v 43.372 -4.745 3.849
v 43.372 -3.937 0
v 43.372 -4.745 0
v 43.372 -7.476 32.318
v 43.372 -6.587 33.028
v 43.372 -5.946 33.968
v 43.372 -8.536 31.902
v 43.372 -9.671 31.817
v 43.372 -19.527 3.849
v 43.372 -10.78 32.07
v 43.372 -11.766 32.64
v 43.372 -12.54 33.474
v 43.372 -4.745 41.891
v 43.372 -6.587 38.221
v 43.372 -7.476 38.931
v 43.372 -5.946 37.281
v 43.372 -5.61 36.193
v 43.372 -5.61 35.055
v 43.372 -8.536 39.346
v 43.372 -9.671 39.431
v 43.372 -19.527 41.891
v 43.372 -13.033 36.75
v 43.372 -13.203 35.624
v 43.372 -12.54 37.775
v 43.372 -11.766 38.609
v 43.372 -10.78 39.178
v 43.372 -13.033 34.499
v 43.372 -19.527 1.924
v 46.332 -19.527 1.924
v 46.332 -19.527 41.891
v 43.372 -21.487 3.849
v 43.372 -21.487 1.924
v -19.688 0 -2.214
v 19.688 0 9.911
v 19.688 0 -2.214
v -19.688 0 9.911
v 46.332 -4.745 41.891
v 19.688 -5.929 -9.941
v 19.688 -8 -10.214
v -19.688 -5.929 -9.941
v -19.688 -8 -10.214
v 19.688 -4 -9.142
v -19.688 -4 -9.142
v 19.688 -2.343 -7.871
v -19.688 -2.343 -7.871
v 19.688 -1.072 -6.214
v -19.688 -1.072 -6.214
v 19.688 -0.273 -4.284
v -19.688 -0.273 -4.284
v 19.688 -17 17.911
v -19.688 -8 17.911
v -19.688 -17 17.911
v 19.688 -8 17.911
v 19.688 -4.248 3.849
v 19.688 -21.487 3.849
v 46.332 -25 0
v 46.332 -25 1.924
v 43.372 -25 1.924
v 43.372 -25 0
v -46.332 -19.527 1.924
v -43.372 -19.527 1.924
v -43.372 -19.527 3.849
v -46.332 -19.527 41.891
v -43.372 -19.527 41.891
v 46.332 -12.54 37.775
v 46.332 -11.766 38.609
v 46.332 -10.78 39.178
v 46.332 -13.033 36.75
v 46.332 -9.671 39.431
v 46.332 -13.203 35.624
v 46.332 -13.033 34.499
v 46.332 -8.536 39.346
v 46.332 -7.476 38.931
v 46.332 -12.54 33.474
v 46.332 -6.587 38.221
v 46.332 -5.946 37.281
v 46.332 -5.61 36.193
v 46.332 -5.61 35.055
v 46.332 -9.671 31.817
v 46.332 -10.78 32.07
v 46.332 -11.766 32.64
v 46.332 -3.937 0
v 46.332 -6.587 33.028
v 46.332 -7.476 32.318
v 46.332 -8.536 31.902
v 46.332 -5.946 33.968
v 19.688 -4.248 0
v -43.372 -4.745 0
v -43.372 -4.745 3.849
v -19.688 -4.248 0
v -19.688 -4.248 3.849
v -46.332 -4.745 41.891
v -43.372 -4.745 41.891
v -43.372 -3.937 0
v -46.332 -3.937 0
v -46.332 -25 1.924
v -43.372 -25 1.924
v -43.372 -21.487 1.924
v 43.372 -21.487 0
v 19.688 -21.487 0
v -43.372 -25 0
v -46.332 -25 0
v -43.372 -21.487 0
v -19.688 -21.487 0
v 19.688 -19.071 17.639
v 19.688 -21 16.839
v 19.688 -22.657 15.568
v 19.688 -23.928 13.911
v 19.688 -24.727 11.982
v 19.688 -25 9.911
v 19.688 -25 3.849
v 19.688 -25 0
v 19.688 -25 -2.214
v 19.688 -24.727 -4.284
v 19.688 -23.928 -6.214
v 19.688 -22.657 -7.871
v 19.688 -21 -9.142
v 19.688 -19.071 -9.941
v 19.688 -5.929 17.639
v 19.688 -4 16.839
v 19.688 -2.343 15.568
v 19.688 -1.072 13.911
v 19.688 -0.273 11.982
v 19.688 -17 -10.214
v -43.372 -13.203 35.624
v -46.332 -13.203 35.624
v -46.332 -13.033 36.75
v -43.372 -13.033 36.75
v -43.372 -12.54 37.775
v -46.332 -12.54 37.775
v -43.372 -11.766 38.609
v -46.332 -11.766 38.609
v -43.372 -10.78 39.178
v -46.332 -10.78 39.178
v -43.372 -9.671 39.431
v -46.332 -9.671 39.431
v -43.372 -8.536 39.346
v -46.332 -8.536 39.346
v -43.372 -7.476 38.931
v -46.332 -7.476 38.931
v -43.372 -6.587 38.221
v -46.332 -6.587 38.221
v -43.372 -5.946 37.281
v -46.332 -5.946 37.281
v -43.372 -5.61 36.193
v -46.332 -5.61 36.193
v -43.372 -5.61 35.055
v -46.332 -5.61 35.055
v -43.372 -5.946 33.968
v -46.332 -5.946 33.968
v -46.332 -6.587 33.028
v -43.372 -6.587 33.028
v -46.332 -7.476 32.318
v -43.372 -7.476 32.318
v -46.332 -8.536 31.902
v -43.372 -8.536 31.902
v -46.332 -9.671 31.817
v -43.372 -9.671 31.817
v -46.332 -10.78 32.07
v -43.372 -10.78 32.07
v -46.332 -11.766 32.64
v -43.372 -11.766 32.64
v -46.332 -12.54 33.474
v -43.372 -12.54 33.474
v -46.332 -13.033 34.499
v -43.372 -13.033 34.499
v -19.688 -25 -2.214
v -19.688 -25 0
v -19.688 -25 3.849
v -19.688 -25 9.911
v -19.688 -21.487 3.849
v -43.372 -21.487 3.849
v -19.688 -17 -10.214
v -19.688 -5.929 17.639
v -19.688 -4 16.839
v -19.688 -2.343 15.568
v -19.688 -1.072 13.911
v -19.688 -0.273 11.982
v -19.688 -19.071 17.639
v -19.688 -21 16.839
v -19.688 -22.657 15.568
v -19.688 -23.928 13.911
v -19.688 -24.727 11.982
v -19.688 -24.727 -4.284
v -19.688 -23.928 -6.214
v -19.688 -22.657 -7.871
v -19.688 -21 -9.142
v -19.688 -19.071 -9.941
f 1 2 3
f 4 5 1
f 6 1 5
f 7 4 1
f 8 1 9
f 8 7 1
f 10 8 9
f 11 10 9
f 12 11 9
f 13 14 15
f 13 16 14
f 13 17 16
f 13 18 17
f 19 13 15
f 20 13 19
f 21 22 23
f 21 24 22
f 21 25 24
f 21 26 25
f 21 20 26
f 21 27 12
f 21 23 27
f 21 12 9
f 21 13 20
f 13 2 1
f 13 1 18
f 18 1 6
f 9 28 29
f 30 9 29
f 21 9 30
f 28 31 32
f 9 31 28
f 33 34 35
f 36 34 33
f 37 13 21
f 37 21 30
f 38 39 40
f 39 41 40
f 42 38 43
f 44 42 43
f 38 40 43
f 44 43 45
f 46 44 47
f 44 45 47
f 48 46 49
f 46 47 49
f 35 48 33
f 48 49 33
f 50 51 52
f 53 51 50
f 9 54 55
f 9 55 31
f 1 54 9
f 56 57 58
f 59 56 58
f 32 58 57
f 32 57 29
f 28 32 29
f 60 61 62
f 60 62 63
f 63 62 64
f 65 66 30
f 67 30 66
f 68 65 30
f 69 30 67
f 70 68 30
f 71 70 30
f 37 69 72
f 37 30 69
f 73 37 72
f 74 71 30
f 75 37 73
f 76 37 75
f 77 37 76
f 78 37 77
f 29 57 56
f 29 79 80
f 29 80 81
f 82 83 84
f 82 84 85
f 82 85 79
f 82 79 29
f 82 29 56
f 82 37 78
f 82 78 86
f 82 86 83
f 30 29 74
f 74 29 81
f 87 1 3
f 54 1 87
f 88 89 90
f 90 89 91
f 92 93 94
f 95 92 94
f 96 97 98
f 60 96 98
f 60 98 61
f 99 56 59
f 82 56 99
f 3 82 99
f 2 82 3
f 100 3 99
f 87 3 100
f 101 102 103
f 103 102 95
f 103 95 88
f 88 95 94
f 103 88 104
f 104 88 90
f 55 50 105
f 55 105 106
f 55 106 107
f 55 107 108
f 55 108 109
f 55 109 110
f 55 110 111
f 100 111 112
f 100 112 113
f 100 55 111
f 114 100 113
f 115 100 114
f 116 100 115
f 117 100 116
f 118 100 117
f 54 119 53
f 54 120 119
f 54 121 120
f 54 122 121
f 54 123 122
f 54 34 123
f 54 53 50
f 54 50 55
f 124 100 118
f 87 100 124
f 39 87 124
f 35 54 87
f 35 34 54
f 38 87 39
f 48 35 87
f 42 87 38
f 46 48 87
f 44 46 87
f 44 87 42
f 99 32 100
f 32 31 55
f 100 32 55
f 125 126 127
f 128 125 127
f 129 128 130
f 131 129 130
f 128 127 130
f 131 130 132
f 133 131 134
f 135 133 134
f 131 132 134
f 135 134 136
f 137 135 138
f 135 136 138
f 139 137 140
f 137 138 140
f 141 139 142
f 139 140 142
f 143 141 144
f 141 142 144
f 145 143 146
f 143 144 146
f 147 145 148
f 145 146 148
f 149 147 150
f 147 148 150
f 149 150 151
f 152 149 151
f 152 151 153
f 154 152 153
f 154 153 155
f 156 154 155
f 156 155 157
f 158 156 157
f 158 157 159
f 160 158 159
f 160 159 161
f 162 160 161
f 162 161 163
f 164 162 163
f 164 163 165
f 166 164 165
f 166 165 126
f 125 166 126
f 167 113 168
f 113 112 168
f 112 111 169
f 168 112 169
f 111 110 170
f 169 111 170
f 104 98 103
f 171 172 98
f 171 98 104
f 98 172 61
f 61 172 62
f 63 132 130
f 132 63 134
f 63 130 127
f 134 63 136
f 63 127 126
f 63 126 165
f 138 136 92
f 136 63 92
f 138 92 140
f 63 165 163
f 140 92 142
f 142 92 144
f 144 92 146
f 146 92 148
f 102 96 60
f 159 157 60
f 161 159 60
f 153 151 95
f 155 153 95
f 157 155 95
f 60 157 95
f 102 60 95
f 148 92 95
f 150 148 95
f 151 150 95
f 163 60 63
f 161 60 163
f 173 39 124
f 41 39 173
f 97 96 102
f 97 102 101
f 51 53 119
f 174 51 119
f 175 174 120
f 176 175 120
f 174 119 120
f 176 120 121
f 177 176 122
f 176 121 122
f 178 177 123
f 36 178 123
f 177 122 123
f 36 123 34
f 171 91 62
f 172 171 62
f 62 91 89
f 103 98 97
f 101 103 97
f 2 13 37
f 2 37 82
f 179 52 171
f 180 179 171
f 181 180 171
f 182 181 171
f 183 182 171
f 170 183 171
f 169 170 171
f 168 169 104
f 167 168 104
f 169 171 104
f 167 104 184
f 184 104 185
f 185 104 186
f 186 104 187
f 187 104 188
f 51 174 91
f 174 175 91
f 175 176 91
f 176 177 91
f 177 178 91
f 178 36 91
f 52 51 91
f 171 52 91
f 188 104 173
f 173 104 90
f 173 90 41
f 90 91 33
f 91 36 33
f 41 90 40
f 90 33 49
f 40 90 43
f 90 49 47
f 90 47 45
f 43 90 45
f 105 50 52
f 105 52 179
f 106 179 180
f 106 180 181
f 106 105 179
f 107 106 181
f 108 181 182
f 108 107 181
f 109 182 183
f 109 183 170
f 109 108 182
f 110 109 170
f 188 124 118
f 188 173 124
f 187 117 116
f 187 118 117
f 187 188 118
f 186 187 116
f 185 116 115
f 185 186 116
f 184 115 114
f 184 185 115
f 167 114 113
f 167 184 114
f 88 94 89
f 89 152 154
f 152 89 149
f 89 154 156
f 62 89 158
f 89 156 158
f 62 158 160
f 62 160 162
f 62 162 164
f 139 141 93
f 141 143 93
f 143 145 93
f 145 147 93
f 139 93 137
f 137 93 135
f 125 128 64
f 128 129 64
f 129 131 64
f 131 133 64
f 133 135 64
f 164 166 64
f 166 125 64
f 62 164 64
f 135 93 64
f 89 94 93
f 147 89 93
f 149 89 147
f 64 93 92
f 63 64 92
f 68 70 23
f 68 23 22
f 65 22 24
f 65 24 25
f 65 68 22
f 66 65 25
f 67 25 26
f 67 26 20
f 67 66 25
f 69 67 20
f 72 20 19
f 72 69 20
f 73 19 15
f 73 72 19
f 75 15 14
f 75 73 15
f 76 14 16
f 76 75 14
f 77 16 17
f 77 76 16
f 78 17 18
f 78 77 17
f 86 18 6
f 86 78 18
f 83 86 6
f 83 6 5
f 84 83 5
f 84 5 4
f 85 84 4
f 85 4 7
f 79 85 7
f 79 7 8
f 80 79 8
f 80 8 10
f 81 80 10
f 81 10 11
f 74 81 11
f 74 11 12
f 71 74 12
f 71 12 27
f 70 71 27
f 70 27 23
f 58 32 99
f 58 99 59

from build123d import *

# Parameters (mm, degrees)
F1_DEPTH = 25
F2_R     = 8
F3_W     = 23.684212938
F3_H     = 3.5125516355
F4_DEPTH = 25
F5_W     = 5.4730284959
F5_H     = 39.9671059567
F6_DEPTH = 25
F7_R     = 3.8177779447
F8_DEPTH = 25


with BuildPart() as f1:
    # F0 (on Front) → F1 (new body)
    with BuildSketch(Plane.XZ):
        Polygon((0, -10.2138156071), (0, 17.9111845791), (-19.6875017136, 17.9111845791), (-19.6875017136, 3.848684486), (-19.6875017136, 0), (-19.6875017136, -10.2138156071), align=None)
        Polygon((-19.6875017136, 0), (-19.6875017136, 3.848684486), (-43.3717146516, 3.848684486), (-43.3717146516, 41.8914481997), (-46.3322401047, 41.8914481997), (-46.3322401047, 0), align=None)
    extrude(amount=F1_DEPTH)

    # F2
    f2_edges = [f1.edges().sort_by_distance(p)[0] for p in [
        (-9.843751, 0, 17.911185),
        (-9.843751, 0, -10.213816),
        (-9.843751, -25, -10.213816),
        (-9.843751, -25, 17.911185),
    ]]
    fillet(f2_edges, radius=F2_R)

    # F3 (on face) → F4 (cut)
    with BuildSketch(Plane.XY.offset(3.848684486)):
        with Locations((-31.5296081826, -23.2437241822)):
            Rectangle(F3_W, F3_H)
        Polygon((-43.3717146516, -4.7452212311), (-19.6875017136, -4.2484635487), (-19.6875017136, 0), (-20.5312147737, 0), (-43.3717146516, 0), align=None)
    extrude(amount=-F4_DEPTH, mode=Mode.SUBTRACT)

    # F5 (on face) → F6 (cut)
    with BuildSketch(Plane.YZ.offset(-43.3717146516)):
        with Locations((-22.263485752, 21.9078952214)):
            Rectangle(F5_W, F5_H)
        Polygon((0, 41.8914481997), (-4.7452212311, 41.8914481997), (-3.9370520972, 0), (0, 0), (0, 40.7377965748), align=None)
    extrude(amount=-F6_DEPTH, mode=Mode.SUBTRACT)

    # F7 (on face) → F8 (cut)
    with BuildSketch(Plane(origin=(-46.3322401047, 0, 0), x_dir=(0, -1, 0), z_dir=(-1, 0, 0))):
        with Locations((9.3853315338, 35.6243662536)):
            Circle(F7_R)
    extrude(amount=-F8_DEPTH, mode=Mode.SUBTRACT)

    # F9: F1 across plane


with BuildPart() as f1_1:
    add(f1.part)
    add(f1.part.mirror(Plane.YZ))


solid = f1_1.part
